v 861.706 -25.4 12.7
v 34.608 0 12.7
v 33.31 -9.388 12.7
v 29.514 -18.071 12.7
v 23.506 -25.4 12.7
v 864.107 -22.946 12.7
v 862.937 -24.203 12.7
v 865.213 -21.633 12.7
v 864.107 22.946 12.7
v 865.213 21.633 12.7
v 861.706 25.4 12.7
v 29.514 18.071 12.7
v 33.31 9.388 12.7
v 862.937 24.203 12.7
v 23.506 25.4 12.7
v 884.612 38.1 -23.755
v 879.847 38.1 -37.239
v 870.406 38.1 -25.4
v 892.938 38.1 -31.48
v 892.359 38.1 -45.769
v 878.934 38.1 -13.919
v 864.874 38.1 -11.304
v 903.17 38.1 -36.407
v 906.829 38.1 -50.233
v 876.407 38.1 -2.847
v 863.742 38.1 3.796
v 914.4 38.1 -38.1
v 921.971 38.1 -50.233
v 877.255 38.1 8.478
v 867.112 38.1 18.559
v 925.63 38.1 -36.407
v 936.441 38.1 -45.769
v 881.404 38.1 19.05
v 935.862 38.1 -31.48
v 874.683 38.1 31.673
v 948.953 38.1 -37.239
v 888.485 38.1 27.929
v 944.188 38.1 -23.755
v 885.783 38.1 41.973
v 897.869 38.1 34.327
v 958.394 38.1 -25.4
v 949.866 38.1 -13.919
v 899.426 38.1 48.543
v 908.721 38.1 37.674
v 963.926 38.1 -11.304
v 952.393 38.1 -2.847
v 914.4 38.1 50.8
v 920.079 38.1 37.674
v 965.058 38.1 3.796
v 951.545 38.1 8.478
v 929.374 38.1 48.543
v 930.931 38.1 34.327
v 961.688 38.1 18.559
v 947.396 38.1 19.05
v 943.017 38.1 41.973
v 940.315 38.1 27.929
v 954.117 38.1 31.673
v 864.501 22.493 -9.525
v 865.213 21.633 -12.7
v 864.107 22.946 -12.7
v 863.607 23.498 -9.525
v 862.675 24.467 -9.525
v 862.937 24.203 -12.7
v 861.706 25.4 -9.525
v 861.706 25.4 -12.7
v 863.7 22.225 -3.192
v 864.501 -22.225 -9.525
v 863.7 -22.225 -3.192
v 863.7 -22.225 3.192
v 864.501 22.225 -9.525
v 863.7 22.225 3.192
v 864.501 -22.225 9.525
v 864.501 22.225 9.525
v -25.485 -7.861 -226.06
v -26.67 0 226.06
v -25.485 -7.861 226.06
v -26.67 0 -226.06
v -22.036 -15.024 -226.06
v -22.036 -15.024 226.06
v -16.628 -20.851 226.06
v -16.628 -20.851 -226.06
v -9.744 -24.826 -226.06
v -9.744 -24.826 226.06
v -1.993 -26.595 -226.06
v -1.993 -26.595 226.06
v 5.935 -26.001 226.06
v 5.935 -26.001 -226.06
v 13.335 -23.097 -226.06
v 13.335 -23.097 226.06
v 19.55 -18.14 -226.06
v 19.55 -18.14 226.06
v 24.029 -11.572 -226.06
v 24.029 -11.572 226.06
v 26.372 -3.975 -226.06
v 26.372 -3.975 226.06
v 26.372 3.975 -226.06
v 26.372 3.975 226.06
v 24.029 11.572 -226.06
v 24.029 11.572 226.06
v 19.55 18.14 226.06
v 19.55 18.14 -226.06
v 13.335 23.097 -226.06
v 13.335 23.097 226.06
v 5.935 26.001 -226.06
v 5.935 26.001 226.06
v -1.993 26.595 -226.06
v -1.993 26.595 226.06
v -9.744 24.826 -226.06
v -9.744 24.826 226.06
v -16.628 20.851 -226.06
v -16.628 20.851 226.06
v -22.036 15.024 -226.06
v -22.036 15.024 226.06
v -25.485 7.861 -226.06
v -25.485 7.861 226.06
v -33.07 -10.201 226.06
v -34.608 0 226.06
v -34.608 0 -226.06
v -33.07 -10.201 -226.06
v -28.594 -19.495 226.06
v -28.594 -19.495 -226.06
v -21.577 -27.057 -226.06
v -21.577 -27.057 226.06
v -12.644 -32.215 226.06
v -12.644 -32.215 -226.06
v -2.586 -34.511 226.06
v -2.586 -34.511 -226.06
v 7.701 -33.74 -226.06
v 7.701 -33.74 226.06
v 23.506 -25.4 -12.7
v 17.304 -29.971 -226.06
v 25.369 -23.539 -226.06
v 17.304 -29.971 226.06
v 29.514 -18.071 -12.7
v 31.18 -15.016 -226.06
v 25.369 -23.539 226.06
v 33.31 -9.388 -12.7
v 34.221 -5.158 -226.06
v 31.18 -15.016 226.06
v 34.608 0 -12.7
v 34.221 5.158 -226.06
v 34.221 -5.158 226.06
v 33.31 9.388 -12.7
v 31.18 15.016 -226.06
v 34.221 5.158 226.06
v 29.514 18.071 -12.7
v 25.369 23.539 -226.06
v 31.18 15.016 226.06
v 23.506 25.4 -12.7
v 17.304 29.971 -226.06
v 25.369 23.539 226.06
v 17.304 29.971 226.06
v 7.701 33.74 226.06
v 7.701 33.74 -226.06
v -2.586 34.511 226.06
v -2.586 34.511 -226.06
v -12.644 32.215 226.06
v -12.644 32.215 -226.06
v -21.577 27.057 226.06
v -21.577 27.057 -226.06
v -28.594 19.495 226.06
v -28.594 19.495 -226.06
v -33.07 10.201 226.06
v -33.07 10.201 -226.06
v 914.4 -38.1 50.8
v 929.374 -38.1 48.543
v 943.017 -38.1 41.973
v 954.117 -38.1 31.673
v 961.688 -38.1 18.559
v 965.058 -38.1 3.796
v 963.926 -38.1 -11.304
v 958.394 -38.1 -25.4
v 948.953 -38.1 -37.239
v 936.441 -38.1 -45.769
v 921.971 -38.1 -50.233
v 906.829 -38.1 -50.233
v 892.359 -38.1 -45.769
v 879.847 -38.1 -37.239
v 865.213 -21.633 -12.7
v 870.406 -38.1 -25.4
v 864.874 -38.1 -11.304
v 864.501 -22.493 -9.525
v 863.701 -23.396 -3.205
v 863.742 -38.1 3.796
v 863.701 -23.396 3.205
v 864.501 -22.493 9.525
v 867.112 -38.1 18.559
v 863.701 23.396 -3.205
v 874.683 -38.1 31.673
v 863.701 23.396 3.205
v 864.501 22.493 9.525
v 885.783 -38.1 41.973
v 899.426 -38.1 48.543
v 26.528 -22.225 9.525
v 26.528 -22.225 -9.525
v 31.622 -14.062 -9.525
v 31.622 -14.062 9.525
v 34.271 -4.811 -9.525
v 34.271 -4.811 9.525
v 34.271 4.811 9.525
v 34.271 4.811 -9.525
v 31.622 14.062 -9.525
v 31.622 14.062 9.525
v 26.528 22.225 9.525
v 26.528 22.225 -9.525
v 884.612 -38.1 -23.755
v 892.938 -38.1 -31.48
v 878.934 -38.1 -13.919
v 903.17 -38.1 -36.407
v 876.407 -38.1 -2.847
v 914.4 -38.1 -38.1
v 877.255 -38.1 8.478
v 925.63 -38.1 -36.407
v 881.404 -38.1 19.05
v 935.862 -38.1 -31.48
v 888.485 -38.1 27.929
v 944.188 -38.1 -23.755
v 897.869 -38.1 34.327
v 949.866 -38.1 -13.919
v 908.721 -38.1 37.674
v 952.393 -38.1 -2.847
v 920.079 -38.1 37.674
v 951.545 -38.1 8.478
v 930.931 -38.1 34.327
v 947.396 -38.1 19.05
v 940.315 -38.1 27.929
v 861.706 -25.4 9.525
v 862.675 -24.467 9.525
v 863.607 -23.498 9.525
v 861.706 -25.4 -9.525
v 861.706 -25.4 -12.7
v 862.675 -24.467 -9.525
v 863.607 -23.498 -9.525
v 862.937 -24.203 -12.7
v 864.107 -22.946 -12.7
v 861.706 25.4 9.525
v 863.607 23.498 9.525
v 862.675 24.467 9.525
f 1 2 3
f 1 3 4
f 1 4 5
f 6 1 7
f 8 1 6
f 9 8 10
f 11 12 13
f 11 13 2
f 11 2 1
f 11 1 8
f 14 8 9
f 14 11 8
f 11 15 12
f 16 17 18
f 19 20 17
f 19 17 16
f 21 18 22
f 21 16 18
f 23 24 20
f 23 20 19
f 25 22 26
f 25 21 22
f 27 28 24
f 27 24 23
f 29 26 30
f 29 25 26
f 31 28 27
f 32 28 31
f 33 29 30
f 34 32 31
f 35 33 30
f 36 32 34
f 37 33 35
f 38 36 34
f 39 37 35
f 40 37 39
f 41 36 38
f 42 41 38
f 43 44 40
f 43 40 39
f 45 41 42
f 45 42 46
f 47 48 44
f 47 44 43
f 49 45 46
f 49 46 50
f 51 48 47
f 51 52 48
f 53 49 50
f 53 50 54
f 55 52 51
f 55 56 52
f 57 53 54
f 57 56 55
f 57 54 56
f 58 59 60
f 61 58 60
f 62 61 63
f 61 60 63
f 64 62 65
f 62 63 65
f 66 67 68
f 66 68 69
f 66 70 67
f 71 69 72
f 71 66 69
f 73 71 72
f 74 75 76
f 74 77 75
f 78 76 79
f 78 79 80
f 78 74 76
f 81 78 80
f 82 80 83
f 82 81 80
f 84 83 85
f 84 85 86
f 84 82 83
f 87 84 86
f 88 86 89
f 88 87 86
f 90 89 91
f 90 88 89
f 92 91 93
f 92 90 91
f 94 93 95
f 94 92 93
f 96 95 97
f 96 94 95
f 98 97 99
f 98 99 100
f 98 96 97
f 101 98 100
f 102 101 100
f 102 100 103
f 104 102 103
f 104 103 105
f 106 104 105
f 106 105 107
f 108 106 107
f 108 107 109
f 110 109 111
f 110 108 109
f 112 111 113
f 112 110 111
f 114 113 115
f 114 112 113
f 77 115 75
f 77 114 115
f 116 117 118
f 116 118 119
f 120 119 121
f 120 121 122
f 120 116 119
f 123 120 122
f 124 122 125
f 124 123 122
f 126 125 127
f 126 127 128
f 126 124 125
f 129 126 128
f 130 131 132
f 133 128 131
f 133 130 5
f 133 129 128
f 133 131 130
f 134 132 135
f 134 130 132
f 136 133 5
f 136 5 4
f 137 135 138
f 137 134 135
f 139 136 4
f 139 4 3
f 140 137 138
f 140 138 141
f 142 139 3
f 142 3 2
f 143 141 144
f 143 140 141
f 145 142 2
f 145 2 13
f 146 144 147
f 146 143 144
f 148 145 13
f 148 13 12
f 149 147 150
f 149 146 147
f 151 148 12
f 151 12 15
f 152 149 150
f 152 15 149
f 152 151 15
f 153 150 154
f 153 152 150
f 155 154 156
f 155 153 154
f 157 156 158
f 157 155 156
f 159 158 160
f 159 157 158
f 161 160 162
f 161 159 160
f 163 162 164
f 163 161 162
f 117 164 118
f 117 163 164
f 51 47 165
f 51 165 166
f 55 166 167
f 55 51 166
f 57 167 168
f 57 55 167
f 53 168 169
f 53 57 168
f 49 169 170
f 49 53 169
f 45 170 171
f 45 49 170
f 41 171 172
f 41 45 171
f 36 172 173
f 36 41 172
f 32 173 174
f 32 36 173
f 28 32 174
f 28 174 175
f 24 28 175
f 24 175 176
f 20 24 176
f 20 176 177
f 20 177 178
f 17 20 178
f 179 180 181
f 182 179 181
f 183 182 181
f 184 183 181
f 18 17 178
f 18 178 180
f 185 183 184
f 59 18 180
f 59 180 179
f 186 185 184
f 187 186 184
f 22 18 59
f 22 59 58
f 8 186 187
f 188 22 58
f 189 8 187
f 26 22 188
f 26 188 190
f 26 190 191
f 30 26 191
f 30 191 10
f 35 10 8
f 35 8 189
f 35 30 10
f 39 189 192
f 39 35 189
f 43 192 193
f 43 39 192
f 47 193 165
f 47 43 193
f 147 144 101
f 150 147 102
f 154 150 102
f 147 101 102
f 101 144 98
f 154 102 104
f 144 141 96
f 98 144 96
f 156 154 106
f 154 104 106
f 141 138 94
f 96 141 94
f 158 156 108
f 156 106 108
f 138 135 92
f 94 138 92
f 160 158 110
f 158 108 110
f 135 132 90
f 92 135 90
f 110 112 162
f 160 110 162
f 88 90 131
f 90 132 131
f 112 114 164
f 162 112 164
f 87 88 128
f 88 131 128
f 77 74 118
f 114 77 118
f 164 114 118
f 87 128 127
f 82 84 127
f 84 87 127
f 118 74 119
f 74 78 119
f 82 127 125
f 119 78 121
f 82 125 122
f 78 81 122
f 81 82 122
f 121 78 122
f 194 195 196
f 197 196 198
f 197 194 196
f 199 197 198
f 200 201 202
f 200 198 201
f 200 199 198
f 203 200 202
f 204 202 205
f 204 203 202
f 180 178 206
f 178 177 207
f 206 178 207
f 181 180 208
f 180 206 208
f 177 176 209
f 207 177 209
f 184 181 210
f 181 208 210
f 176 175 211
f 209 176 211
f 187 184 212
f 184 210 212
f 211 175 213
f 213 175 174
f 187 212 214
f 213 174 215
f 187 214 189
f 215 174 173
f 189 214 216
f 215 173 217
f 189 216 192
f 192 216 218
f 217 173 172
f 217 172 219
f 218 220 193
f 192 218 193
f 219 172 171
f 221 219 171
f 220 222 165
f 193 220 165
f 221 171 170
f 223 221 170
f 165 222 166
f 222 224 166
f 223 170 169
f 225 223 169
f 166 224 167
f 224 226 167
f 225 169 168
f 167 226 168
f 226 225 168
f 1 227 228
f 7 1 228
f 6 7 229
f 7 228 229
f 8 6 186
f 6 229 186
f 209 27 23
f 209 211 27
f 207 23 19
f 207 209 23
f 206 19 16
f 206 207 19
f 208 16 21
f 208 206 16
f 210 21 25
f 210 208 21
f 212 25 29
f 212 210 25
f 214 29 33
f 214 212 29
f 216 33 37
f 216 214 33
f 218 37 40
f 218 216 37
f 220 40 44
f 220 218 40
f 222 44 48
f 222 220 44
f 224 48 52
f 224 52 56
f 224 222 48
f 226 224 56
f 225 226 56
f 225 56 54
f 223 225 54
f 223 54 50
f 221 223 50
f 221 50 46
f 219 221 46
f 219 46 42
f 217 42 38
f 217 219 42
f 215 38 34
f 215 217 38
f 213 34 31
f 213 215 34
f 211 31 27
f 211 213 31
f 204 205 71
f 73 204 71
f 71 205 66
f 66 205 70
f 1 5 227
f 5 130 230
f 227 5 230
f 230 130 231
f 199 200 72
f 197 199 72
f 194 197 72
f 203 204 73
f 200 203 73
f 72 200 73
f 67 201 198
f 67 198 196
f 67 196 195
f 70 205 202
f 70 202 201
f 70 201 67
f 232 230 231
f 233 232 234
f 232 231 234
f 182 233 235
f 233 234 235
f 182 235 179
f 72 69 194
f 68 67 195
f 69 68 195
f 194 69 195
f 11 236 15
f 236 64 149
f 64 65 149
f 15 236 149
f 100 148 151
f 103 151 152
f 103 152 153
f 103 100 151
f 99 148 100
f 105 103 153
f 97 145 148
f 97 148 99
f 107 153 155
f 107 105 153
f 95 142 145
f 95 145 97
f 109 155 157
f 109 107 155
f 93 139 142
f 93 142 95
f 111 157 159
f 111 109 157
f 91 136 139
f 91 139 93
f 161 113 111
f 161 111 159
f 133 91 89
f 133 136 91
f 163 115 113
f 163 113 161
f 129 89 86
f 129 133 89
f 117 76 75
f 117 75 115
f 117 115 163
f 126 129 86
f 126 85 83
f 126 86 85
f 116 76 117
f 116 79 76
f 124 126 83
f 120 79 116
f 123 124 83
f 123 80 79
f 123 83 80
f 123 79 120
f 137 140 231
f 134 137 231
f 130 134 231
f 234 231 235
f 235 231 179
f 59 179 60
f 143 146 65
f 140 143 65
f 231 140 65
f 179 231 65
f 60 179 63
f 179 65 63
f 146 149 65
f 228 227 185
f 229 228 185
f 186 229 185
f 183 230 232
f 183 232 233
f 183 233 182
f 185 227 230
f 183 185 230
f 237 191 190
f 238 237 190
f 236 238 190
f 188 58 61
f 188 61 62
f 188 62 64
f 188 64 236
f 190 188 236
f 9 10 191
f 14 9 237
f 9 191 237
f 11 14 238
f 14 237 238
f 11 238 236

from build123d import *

# Parameters (mm, degrees)
SKETCH1_R             = 34.6075
SKETCH1_R_2           = 26.67
BOSS_EXTRUDE1_DEPTH   = 226.06
BOSS_EXTRUDE2_START   = -12.7
BOSS_EXTRUDE2_DEPTH   = 3.175
BOSS_EXTRUDE2_START_2 = 9.525
BOSS_EXTRUDE2_2_DEPTH = 3.175
BOSS_EXTRUDE2_START_3 = -9.525
BOSS_EXTRUDE2_3_DEPTH = 19.05
SKETCH3_R             = 50.8
SKETCH3_R_2           = 38.1
BOSS_EXTRUDE3_DEPTH   = 38.1


# Read off the part's stored shape, not the designer's step: Boss-Extrude2
with BuildPart() as part:
    # Sketch1 → Boss-Extrude1 (new, symmetric)
    with BuildSketch(Plane.XY):
        with Locations(Location((0, 0, 0), (0, 0, 180))):
            Circle(SKETCH1_R)
        with Locations(Location((0, 0, 0), (0, 0, 180))):
            Circle(SKETCH1_R_2, mode=Mode.SUBTRACT)
    extrude(amount=BOSS_EXTRUDE1_DEPTH, both=True)

    # Boss-Extrude2 outline → Boss-Extrude2 (add)
    with BuildSketch(Plane.XY.offset(BOSS_EXTRUDE2_START)):
        with BuildLine():
            Line((861.705723904, 25.4), (23.505723904, 25.4))
            ThreePointArc((23.505723904, 25.4), (34.6075, 0), (23.505723904, -25.4))
            Line((23.505723904, -25.4), (861.705723904, -25.4))
            ThreePointArc((861.705723904, -25.4), (872.8075, 0), (861.705723904, 25.4))
        make_face()
    extrude(amount=BOSS_EXTRUDE2_DEPTH)

    # Boss-Extrude2 2 outline → Boss-Extrude2 2 (add)
    with BuildSketch(Plane.XY.offset(BOSS_EXTRUDE2_START_2)):
        with BuildLine():
            Line((861.705723904, 25.4), (23.505723904, 25.4))
            ThreePointArc((23.505723904, 25.4), (34.6075, 0), (23.505723904, -25.4))
            Line((23.505723904, -25.4), (861.705723904, -25.4))
            ThreePointArc((861.705723904, -25.4), (872.8075, 0), (861.705723904, 25.4))
        make_face()
    extrude(amount=BOSS_EXTRUDE2_2_DEPTH)

    # Boss-Extrude2 3 outline → Boss-Extrude2 3 (add)
    with BuildSketch(Plane.XY.offset(BOSS_EXTRUDE2_START_3)):
        with BuildLine():
            ThreePointArc((864.727880263, 22.225), (863.267120751, 23.86039634), (861.705723904, 25.4))
            Line((861.705723904, 25.4), (23.505723904, 25.4))
            ThreePointArc((23.505723904, 25.4), (25.067120751, 23.86039634), (26.527880263, 22.225))
            Line((26.527880263, 22.225), (864.727880263, 22.225))
        make_face()
        with BuildLine():
            ThreePointArc((861.705723904, -25.4), (863.267120751, -23.86039634), (864.727880263, -22.225))
            Line((864.727880263, -22.225), (26.527880263, -22.225))
            ThreePointArc((26.527880263, -22.225), (25.067120751, -23.86039634), (23.505723904, -25.4))
            Line((23.505723904, -25.4), (861.705723904, -25.4))
        make_face()
    extrude(amount=BOSS_EXTRUDE2_3_DEPTH)

    # Sketch3 → Boss-Extrude3 (add, symmetric)
    with BuildSketch(Plane(origin=(0, 0, 0), x_dir=(1, 0, 0), z_dir=(0, 1, 0))):
        with Locations(Location((914.4, 0, 0), (0, 0, 270))):
            Circle(SKETCH3_R)
        with Locations(Location((914.4, 0, 0), (0, 0, 90))):
            Circle(SKETCH3_R_2, mode=Mode.SUBTRACT)
    extrude(amount=BOSS_EXTRUDE3_DEPTH, both=True)


solid = part.part
